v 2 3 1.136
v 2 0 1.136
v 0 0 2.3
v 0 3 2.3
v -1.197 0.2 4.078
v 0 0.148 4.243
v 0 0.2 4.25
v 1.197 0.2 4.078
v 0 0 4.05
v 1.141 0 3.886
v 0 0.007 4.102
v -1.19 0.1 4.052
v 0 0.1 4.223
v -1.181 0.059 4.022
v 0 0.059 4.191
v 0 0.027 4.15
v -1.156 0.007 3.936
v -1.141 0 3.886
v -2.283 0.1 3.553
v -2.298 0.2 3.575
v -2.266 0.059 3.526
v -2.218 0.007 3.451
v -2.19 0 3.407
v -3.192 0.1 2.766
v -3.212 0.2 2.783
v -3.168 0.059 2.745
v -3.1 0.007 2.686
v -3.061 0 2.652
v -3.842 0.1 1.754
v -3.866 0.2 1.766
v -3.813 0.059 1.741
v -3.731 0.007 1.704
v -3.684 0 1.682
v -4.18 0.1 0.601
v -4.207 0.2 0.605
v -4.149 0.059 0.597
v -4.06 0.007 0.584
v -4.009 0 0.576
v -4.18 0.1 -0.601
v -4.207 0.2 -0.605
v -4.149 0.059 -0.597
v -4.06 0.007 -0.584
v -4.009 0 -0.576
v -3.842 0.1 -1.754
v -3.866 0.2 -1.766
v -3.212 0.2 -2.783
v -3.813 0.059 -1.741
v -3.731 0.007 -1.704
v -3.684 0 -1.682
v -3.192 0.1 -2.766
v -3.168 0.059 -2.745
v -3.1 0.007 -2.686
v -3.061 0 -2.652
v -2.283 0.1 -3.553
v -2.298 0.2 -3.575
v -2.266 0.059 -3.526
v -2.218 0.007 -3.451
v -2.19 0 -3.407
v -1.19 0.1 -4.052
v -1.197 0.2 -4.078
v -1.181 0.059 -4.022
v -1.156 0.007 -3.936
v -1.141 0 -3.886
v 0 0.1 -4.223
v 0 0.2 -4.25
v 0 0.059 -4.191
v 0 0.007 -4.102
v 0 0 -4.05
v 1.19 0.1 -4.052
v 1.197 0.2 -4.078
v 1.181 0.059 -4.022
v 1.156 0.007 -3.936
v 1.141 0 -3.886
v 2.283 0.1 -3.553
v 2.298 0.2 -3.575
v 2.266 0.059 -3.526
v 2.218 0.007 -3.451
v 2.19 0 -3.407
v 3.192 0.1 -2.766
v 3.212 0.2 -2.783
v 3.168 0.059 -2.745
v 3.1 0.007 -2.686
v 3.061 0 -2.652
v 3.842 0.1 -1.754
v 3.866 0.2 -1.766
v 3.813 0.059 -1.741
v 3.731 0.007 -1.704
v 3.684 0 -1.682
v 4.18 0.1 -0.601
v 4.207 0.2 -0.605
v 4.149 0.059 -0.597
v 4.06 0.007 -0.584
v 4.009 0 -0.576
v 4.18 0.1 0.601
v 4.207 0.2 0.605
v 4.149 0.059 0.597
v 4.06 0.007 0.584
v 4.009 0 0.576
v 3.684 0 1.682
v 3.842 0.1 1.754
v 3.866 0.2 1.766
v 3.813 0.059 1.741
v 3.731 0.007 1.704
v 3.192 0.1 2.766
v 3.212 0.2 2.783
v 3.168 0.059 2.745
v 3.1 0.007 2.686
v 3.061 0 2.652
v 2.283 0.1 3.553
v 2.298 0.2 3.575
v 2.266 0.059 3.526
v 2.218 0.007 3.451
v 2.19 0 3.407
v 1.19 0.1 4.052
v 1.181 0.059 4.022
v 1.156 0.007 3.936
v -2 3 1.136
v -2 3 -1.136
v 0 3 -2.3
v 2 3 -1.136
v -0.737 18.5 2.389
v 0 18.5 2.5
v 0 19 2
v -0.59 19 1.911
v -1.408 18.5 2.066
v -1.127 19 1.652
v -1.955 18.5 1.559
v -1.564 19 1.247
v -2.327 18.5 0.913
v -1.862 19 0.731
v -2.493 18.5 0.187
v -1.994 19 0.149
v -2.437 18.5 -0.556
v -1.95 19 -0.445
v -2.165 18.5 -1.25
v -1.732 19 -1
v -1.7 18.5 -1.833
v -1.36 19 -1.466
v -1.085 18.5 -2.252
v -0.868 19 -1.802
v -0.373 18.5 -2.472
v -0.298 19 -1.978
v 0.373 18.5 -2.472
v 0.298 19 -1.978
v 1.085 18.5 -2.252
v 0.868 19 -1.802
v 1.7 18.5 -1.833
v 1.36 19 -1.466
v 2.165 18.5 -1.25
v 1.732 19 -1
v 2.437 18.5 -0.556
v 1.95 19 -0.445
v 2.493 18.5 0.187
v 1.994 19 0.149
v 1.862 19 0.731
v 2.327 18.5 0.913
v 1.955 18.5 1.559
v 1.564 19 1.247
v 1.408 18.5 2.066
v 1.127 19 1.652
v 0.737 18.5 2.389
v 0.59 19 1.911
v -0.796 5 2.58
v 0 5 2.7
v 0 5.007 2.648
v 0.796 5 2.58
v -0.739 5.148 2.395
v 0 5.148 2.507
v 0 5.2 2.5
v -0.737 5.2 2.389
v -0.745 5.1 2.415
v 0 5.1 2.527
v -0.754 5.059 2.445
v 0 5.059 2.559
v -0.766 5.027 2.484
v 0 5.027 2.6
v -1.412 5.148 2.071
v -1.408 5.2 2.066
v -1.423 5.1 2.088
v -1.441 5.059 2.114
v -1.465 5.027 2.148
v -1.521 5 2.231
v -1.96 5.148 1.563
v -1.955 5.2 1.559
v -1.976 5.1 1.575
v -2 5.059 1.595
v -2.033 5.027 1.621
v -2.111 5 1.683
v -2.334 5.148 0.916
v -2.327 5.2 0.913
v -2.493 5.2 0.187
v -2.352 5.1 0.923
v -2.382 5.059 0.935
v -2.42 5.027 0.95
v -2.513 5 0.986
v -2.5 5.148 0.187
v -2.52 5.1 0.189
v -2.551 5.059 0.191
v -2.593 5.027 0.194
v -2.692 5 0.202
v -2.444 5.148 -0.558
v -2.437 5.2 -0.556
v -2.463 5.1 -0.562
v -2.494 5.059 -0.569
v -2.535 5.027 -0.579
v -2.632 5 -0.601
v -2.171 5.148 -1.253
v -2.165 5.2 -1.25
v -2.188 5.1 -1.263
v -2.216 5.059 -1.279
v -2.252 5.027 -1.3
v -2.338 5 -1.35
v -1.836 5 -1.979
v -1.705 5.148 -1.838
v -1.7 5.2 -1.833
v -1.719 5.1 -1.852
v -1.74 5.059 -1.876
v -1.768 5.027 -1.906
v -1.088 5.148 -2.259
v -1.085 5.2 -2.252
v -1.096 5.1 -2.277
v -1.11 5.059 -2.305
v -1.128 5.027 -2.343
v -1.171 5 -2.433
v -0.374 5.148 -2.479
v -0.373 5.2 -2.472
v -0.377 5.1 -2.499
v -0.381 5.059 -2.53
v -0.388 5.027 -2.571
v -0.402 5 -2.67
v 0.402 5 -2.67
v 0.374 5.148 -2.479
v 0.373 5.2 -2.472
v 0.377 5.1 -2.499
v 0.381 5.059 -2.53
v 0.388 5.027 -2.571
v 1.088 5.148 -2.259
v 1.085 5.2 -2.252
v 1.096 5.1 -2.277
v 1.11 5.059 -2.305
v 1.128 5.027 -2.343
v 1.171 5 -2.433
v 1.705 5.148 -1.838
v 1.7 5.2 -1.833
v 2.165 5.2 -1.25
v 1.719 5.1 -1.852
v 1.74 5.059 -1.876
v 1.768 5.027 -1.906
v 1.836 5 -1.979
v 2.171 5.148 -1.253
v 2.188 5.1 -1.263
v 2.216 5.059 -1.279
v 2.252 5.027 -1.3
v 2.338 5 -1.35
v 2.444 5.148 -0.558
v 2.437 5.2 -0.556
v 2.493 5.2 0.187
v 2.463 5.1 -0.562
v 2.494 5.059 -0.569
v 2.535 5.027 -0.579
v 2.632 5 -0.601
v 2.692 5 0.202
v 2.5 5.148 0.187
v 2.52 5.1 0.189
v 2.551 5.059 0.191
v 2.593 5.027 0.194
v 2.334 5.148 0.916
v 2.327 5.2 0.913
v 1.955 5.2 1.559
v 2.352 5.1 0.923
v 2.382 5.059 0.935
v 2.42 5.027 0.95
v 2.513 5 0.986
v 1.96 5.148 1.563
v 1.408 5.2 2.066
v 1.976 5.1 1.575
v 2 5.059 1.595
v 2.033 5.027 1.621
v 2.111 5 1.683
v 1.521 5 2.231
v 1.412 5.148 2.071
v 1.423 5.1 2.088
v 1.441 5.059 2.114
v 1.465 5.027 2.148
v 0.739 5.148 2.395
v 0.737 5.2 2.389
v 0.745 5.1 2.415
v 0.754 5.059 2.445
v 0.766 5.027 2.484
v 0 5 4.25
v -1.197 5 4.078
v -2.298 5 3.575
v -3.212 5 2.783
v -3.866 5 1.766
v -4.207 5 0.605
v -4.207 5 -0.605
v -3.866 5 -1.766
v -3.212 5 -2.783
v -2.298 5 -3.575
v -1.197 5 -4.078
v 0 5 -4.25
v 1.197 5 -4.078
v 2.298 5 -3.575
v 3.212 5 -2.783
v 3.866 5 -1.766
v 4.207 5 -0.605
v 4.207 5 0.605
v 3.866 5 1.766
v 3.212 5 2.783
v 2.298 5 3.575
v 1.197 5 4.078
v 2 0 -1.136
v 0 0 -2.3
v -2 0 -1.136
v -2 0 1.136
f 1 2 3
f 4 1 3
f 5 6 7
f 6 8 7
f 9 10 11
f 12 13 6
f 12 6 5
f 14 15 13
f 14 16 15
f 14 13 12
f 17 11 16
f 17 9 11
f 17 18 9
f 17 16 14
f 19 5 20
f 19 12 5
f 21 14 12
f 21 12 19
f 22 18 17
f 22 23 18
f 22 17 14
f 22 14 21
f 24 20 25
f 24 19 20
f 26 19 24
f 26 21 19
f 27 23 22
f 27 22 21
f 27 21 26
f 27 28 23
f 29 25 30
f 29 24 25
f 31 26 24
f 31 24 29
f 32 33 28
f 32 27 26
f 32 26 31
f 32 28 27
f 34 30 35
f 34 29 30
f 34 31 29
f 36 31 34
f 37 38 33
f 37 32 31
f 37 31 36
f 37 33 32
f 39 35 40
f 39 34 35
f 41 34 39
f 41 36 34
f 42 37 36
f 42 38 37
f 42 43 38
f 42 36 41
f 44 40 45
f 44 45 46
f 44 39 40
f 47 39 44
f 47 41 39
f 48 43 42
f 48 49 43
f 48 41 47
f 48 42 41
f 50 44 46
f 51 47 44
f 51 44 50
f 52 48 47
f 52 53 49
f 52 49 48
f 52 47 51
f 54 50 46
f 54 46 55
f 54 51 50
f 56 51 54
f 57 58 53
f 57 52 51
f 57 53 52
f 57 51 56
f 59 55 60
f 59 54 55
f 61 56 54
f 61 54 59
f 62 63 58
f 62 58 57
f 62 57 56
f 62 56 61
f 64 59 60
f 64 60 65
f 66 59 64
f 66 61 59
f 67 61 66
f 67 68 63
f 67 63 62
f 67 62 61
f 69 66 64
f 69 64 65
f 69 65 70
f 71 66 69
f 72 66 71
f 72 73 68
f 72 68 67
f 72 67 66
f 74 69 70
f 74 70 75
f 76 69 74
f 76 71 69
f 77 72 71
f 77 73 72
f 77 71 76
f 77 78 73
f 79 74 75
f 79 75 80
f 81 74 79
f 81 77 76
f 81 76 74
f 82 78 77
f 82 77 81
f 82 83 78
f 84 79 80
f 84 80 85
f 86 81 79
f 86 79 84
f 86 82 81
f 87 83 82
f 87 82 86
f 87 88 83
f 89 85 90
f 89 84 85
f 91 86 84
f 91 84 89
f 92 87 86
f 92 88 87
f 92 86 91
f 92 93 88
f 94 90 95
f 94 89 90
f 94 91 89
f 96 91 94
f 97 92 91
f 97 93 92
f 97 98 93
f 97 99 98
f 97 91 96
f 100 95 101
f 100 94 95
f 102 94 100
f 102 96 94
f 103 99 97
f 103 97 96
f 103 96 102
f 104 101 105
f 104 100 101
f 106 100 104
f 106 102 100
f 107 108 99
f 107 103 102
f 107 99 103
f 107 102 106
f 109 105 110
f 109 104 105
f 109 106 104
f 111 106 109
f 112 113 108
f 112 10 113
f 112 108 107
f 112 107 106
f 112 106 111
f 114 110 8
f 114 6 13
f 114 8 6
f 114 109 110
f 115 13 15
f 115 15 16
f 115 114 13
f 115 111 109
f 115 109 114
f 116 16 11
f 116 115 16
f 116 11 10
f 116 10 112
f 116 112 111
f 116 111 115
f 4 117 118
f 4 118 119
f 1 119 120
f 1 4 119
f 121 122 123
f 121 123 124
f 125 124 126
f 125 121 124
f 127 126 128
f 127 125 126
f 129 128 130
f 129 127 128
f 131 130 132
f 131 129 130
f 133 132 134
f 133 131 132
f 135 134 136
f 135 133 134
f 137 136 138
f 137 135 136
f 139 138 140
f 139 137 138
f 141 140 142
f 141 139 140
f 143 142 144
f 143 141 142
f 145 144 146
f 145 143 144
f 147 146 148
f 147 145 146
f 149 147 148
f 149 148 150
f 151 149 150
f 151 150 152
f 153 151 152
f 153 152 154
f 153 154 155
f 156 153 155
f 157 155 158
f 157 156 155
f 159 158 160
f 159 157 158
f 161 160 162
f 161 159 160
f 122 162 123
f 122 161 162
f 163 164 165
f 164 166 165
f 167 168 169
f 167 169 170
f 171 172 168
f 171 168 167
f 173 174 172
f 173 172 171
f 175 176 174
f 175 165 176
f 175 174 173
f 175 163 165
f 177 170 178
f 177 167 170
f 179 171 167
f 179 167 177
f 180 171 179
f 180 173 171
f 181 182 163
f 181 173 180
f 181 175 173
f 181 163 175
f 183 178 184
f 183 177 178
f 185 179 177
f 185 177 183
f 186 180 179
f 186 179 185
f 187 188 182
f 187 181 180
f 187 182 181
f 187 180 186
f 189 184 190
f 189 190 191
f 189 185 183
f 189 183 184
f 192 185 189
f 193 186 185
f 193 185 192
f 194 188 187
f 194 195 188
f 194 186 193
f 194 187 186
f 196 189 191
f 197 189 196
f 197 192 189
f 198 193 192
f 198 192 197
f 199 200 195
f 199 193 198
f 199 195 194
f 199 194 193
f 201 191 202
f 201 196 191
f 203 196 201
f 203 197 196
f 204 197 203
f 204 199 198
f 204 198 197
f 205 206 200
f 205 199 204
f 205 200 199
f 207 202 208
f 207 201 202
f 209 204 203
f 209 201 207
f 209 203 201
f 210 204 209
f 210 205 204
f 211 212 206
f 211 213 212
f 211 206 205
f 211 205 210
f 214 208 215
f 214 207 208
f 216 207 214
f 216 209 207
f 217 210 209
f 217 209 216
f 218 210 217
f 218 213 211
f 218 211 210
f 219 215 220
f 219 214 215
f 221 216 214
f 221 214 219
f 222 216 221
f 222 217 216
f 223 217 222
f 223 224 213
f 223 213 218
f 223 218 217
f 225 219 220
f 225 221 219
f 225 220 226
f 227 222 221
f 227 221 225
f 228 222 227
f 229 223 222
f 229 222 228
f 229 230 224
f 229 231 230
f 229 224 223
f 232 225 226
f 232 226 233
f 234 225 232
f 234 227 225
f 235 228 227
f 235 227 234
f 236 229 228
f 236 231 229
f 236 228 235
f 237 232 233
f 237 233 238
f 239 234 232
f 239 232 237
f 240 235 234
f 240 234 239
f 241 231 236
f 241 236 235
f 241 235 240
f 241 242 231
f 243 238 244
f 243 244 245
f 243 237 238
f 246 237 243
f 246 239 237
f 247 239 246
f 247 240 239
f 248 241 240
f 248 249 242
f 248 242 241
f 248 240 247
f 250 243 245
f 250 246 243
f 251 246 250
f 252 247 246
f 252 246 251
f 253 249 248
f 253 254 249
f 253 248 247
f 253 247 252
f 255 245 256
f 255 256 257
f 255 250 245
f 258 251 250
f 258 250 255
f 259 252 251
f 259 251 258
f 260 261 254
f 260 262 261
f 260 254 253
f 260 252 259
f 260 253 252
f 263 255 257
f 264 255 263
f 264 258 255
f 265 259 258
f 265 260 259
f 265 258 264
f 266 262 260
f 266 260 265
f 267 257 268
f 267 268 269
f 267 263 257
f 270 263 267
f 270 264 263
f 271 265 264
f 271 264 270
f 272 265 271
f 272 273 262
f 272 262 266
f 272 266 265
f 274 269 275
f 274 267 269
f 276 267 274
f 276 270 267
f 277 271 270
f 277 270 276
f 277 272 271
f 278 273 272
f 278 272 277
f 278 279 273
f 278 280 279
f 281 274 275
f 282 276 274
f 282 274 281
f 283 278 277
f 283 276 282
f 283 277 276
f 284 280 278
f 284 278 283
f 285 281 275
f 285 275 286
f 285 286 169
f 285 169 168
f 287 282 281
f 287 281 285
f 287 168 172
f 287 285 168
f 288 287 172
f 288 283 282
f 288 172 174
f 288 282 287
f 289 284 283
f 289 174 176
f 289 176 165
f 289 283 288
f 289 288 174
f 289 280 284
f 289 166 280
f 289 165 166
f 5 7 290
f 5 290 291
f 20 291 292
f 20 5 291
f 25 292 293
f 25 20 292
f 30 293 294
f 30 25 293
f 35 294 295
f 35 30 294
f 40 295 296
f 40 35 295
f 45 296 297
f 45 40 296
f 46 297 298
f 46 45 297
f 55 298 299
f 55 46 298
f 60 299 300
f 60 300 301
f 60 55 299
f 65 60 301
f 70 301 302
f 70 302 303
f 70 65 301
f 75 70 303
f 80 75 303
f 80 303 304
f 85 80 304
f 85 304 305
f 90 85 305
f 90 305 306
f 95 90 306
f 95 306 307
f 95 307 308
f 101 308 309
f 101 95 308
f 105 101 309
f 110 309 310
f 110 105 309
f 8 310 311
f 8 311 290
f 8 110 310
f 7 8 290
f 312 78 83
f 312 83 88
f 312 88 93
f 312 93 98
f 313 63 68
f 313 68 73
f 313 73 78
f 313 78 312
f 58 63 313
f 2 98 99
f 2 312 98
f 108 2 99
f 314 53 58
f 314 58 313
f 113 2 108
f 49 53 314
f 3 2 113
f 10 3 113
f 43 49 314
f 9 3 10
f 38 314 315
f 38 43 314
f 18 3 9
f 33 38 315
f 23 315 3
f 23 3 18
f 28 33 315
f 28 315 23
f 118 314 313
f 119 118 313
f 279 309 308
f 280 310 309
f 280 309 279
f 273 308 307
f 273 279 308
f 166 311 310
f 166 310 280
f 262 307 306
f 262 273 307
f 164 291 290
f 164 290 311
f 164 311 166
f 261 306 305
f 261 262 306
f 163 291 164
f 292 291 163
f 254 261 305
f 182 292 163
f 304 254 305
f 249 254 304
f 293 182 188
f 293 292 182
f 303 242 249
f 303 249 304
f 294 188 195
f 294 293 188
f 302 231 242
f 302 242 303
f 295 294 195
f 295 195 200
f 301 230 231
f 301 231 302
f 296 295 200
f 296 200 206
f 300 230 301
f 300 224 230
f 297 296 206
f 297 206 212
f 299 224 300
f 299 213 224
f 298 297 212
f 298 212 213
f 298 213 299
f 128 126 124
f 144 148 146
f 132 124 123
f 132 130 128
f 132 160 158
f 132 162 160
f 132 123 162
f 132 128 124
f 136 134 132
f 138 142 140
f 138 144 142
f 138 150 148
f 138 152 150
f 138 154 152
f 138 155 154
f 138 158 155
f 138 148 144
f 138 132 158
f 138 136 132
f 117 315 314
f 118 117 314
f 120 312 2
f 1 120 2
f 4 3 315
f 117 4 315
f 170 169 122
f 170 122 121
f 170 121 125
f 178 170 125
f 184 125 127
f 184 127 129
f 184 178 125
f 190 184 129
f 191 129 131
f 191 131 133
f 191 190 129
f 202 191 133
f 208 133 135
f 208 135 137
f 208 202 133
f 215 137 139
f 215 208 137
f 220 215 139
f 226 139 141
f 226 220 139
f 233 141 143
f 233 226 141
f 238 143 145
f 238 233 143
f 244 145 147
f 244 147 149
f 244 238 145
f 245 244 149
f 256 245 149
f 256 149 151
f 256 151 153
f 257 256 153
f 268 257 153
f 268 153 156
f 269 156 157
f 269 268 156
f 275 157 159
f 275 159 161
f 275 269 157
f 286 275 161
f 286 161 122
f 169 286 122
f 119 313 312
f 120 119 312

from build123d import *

# Parameters (mm, degrees)
F2_SIZE  = 0.5
F3_R     = 0.2
F5_DEPTH = 3


with BuildPart() as f1:
    # F0 (on Right) → F1 (revolve)
    with BuildSketch(Plane.YZ):
        Polygon((0, 4.25), (0, 0), (19, 0), (19, 2.5), (5, 2.5), (5, 4.25), align=None)
    revolve(axis=Axis((0, 9.5, 0), (0, -1, 0)))

    # F2
    f2_edges = [f1.edges().sort_by_distance(p)[0] for p in [
        (0, 19, -2.5),
    ]]
    chamfer(f2_edges, length=F2_SIZE)

    # F3
    f3_edges = [f1.edges().sort_by_distance(p)[0] for p in [
        (0, 5, -2.5),
        (0, 0, -4.25),
    ]]
    fillet(f3_edges, radius=F3_R)

    # F4 (on face) → F5 (cut)
    with BuildSketch(Plane.XZ):
        Polygon((2, -1.135782), (2, 1.135782), (0, 2.3), (-2, 1.135782), (-2, -1.135782), (0, -2.3), align=None)
    extrude(amount=-F5_DEPTH, mode=Mode.SUBTRACT)


solid = f1.part
